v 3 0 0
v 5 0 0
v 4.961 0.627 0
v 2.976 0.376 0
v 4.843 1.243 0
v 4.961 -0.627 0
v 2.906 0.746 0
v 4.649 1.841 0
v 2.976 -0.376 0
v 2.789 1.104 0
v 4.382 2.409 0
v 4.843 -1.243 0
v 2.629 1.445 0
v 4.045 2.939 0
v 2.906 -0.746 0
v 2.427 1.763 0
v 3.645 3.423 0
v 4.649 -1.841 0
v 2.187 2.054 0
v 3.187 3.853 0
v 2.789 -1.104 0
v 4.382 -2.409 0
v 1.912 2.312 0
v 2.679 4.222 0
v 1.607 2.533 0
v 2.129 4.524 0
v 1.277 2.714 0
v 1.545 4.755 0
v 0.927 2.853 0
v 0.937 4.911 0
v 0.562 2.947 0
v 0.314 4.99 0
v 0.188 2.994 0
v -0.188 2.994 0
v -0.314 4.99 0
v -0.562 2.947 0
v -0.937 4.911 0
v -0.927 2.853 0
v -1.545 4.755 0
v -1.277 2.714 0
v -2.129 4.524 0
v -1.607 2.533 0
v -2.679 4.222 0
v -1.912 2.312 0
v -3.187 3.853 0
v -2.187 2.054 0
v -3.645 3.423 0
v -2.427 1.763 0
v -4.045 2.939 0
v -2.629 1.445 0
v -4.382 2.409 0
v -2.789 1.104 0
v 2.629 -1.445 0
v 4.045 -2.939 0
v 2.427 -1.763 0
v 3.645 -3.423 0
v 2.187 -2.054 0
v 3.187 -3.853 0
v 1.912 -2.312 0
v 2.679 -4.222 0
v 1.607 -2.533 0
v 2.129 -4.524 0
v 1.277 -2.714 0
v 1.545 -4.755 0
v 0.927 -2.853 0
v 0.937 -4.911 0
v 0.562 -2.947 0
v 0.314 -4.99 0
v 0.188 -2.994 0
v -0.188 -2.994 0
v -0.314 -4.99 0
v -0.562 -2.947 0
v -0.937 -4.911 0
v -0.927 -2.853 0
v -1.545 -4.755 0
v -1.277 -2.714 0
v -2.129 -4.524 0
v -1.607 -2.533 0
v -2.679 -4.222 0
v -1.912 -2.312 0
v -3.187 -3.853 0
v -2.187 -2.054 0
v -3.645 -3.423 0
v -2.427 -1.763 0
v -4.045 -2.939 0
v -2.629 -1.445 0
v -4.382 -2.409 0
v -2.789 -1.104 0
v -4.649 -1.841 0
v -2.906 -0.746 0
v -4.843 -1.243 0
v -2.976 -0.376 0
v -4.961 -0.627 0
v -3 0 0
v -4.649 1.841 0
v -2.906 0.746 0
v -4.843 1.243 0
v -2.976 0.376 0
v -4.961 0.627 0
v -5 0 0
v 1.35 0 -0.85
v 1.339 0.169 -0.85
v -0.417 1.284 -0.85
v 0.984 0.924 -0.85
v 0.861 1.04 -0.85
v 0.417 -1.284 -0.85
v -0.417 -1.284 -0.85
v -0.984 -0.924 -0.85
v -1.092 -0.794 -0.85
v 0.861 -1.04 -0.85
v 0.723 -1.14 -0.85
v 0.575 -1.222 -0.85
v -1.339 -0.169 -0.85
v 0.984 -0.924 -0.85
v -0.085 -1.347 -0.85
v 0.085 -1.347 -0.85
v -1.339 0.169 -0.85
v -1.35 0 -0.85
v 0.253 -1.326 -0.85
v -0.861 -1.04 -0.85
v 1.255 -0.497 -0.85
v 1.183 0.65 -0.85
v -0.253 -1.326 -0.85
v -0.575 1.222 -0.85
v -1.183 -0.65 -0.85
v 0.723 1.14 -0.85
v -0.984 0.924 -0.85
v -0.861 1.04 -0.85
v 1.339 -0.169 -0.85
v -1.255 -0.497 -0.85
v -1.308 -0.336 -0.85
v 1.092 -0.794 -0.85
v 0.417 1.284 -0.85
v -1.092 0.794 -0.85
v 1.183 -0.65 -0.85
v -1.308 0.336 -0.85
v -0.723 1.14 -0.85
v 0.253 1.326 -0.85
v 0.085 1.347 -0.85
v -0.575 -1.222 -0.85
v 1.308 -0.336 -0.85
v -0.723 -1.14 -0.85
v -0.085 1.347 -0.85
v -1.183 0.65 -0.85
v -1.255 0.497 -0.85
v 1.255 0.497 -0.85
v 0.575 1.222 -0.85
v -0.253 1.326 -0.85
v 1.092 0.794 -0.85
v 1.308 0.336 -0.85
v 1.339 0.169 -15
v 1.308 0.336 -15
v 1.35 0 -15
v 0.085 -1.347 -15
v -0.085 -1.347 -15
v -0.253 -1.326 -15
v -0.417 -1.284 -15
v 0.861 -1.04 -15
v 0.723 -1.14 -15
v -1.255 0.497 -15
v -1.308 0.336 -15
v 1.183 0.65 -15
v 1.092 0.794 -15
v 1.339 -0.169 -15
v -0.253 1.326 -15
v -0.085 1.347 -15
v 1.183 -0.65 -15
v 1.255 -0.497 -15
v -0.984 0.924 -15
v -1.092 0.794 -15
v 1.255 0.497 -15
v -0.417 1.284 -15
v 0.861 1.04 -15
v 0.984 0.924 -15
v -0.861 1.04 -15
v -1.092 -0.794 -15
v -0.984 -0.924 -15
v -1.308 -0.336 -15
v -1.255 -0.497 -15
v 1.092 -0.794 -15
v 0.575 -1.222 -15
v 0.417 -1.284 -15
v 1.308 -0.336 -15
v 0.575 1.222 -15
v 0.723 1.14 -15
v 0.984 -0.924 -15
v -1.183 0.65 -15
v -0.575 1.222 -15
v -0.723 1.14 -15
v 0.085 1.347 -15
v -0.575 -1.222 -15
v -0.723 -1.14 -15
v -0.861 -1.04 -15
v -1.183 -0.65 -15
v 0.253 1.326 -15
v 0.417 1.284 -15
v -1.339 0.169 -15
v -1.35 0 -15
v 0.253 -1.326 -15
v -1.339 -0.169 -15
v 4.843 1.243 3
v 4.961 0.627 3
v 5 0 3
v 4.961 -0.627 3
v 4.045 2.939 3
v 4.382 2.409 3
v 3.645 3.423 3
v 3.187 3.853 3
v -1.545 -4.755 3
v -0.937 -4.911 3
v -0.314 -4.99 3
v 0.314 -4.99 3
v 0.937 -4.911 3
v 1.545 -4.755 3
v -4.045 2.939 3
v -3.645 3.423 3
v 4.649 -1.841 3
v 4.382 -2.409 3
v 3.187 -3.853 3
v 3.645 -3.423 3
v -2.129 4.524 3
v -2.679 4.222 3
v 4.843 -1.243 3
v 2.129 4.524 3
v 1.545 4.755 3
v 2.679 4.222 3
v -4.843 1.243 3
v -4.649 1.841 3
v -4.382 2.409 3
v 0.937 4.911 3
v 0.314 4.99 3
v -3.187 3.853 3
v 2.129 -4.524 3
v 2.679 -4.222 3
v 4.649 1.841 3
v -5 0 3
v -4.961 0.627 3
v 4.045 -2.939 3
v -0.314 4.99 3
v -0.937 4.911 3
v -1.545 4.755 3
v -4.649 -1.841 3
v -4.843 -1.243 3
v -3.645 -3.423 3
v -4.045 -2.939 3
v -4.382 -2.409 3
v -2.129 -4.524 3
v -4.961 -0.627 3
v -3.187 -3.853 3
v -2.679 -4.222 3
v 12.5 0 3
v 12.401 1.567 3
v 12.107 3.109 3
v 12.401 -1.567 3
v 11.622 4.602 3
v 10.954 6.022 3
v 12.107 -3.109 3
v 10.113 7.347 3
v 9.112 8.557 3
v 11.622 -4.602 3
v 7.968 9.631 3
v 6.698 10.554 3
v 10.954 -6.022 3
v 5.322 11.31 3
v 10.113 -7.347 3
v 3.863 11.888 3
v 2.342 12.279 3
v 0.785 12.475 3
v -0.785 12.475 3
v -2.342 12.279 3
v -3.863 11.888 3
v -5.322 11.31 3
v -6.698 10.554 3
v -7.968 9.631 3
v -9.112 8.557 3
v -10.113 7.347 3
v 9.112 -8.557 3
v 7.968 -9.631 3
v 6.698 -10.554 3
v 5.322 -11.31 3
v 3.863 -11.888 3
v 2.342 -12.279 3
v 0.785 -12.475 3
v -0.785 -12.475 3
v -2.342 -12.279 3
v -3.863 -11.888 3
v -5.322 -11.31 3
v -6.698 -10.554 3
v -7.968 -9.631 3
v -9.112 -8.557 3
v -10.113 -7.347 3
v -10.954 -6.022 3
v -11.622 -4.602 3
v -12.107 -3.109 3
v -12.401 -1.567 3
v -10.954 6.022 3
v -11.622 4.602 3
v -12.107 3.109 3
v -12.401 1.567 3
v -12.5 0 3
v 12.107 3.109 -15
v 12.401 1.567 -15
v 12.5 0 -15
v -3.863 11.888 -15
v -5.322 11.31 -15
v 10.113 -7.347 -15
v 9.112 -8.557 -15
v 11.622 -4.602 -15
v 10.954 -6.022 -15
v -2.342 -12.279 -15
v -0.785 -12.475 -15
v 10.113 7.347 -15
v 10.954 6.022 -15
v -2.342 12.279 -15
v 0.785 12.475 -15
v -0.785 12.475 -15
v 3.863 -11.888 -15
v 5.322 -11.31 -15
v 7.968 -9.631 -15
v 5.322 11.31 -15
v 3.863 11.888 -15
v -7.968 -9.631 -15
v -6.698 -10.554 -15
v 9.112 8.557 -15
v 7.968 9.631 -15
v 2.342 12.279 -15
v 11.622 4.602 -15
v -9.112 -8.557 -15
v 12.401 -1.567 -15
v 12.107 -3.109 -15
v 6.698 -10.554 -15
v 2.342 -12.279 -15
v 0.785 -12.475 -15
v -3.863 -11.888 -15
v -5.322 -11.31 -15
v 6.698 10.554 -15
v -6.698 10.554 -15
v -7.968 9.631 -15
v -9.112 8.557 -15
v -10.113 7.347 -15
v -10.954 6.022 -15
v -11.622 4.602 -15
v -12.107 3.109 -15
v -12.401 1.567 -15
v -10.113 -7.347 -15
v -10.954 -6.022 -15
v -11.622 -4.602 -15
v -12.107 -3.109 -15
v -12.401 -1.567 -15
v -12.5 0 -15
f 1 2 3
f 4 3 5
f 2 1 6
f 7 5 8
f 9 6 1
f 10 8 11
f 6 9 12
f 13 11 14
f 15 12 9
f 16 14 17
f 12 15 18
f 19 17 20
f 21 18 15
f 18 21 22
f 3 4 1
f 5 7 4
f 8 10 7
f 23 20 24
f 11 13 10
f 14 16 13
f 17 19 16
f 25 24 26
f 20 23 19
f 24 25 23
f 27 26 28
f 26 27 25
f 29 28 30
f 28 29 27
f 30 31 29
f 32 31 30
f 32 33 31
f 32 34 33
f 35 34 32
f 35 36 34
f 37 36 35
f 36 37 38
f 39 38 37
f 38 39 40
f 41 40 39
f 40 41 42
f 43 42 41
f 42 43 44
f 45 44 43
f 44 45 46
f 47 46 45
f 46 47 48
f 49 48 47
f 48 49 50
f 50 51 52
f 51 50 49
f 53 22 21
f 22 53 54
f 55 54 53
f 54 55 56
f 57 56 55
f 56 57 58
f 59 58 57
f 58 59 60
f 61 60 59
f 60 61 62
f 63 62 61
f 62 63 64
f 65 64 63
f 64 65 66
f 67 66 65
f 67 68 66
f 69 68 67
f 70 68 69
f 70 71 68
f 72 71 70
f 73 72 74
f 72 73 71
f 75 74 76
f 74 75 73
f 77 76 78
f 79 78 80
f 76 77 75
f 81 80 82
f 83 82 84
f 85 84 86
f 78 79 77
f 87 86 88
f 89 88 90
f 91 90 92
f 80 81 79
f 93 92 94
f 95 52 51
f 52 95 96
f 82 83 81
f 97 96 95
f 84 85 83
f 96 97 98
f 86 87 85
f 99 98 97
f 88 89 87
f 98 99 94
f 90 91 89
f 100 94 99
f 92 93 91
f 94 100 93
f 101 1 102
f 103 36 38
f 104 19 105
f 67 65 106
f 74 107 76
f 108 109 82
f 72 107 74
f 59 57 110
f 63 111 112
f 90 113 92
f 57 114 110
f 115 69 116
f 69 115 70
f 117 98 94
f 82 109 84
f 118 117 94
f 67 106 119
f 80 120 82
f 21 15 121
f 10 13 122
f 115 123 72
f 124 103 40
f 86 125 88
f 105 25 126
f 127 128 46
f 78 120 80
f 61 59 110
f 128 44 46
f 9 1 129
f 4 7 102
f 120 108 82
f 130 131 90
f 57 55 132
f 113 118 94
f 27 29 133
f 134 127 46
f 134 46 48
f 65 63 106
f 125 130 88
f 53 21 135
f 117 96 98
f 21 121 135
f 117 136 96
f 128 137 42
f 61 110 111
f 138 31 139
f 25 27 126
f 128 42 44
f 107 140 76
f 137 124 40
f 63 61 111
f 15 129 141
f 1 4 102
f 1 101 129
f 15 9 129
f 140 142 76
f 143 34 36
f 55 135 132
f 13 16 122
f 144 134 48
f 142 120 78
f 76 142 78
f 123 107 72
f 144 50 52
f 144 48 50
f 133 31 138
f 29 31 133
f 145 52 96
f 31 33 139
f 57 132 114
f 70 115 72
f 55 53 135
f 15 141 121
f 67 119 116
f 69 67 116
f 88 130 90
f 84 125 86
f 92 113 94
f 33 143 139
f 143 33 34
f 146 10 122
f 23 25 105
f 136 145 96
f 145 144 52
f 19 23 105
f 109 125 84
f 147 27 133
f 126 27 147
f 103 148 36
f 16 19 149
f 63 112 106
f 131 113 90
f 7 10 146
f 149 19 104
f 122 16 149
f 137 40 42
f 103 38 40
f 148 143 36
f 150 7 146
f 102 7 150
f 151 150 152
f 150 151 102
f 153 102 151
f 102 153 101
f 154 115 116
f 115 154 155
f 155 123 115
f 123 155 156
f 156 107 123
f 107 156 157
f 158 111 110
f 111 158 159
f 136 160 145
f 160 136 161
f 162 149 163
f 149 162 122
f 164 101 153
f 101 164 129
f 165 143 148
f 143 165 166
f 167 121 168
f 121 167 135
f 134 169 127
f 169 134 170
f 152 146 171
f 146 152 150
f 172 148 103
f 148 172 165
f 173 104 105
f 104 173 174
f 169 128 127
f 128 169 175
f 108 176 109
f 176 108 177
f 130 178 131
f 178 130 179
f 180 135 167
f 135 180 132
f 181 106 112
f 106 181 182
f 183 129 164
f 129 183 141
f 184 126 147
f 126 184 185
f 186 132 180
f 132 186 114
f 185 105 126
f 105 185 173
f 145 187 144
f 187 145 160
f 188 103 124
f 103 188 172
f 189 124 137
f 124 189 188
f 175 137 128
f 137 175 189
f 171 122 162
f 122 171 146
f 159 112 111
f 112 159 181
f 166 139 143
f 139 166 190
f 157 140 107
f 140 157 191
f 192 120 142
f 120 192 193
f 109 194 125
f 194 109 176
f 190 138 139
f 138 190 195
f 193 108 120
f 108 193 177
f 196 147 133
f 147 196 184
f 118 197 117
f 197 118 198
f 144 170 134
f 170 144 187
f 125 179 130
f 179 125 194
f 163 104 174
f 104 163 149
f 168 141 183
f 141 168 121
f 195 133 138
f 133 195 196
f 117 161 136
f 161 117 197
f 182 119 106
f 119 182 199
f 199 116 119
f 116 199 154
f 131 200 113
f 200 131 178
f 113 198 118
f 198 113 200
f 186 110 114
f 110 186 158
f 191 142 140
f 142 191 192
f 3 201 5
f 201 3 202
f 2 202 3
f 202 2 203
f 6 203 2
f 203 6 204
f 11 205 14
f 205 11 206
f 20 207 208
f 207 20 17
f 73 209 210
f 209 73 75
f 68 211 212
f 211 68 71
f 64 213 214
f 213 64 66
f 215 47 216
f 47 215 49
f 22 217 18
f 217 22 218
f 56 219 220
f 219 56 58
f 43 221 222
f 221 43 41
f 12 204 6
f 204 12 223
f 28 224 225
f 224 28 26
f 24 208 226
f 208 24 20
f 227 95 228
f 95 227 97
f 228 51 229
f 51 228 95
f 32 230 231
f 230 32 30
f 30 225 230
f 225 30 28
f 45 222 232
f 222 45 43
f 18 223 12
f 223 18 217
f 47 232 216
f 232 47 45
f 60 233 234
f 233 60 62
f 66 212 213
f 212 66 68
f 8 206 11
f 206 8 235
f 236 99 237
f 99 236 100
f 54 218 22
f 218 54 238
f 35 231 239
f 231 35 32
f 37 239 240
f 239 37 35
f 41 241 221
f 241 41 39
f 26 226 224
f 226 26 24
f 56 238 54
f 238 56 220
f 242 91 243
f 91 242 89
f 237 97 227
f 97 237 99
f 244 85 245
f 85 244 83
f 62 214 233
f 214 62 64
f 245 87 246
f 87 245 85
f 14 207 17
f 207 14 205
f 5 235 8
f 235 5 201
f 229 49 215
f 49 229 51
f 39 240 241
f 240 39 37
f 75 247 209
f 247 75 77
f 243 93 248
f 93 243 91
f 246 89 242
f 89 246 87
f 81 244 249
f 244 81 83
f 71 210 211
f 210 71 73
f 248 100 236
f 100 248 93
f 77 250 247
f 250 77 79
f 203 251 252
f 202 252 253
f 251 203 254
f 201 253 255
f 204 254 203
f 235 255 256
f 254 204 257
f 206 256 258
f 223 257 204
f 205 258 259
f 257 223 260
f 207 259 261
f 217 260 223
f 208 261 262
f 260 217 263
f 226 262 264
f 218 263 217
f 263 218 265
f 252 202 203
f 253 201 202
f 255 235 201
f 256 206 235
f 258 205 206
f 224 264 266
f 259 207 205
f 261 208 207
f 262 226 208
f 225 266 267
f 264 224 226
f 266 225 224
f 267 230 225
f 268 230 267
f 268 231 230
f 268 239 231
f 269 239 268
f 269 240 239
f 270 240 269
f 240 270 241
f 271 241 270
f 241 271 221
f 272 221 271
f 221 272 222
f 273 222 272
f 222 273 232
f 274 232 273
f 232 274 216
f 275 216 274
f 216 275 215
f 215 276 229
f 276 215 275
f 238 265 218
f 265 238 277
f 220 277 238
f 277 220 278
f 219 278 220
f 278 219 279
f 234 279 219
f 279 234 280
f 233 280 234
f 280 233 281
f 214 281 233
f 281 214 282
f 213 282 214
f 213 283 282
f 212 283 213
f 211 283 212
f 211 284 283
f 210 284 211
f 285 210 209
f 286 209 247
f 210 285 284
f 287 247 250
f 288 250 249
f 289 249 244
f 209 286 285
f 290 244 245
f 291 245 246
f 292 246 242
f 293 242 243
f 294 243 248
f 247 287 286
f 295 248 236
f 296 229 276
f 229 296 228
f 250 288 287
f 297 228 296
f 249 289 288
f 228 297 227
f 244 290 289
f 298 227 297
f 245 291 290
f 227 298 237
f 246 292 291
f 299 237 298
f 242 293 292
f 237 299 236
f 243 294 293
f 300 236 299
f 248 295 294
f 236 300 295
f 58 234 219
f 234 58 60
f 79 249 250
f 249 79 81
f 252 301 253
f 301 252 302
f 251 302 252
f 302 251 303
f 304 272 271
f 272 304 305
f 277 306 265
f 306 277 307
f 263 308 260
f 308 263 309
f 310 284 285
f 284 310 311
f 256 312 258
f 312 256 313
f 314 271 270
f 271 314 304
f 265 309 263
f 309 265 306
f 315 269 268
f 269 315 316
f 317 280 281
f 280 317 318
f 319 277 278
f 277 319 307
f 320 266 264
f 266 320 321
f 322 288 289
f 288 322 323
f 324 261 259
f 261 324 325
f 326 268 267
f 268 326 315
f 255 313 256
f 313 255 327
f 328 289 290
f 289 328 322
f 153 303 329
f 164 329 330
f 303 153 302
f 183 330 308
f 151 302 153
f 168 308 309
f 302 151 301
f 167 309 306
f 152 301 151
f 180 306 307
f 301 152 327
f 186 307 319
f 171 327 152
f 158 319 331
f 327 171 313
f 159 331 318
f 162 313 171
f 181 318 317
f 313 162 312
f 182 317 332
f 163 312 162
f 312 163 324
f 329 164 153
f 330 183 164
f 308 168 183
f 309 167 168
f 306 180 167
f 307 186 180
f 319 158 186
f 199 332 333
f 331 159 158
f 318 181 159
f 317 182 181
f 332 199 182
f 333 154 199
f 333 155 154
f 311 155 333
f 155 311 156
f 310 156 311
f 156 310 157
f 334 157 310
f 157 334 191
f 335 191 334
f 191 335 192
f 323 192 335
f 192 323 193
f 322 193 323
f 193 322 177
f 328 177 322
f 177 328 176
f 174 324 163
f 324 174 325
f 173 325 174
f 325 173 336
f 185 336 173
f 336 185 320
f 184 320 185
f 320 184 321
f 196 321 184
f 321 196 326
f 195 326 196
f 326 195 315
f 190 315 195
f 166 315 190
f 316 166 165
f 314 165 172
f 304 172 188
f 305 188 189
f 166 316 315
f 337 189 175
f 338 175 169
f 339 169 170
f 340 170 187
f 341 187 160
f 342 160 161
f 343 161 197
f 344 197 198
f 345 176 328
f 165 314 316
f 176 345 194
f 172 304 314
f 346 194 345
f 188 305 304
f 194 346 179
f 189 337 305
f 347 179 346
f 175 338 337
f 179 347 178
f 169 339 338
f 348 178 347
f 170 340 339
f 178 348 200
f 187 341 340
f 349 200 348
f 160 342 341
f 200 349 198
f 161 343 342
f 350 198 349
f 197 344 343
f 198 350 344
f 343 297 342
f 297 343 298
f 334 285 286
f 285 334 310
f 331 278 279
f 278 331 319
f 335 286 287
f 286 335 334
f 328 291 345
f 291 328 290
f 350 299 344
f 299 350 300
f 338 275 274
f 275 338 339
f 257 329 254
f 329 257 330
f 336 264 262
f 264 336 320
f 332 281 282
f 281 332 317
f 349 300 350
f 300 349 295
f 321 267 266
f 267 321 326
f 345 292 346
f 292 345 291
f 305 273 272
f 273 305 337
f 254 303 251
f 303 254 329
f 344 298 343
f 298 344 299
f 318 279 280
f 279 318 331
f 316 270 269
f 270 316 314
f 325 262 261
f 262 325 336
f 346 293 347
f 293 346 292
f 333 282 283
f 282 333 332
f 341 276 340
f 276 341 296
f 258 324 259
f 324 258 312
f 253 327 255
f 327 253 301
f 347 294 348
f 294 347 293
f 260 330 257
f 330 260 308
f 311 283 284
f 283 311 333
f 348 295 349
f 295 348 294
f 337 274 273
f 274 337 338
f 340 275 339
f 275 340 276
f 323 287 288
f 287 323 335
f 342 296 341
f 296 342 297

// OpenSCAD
$fn = 50;


difference() {
	union() {
		translate(v = [0, 0, -15.0000000000]) {
			cylinder(h = 18, r = 12.5000000000);
		}
	}
	union() {
		translate(v = [0, 0, 0]) {
			rotate(a = [0, 0, 0]) {
				difference() {
					union() {
						translate(v = [0, 0, -18.0000000000]) {
							cylinder(h = 18, r = 1.0000000000);
						}
						translate(v = [0, 0, -0.8500000000]) {
							cylinder(h = 0.8500000000, r1 = 1.3500000000, r2 = 3.0000000000);
						}
						translate(v = [0, 0, -18.0000000000]) {
							cylinder(h = 18, r = 1.3500000000);
						}
						translate(v = [0, 0, -18.0000000000]) {
							cylinder(h = 18, r = 1.0000000000);
						}
					}
					union();
				}
			}
		}
		#cylinder(h = 3, r = 5.0000000000);
	}
}
